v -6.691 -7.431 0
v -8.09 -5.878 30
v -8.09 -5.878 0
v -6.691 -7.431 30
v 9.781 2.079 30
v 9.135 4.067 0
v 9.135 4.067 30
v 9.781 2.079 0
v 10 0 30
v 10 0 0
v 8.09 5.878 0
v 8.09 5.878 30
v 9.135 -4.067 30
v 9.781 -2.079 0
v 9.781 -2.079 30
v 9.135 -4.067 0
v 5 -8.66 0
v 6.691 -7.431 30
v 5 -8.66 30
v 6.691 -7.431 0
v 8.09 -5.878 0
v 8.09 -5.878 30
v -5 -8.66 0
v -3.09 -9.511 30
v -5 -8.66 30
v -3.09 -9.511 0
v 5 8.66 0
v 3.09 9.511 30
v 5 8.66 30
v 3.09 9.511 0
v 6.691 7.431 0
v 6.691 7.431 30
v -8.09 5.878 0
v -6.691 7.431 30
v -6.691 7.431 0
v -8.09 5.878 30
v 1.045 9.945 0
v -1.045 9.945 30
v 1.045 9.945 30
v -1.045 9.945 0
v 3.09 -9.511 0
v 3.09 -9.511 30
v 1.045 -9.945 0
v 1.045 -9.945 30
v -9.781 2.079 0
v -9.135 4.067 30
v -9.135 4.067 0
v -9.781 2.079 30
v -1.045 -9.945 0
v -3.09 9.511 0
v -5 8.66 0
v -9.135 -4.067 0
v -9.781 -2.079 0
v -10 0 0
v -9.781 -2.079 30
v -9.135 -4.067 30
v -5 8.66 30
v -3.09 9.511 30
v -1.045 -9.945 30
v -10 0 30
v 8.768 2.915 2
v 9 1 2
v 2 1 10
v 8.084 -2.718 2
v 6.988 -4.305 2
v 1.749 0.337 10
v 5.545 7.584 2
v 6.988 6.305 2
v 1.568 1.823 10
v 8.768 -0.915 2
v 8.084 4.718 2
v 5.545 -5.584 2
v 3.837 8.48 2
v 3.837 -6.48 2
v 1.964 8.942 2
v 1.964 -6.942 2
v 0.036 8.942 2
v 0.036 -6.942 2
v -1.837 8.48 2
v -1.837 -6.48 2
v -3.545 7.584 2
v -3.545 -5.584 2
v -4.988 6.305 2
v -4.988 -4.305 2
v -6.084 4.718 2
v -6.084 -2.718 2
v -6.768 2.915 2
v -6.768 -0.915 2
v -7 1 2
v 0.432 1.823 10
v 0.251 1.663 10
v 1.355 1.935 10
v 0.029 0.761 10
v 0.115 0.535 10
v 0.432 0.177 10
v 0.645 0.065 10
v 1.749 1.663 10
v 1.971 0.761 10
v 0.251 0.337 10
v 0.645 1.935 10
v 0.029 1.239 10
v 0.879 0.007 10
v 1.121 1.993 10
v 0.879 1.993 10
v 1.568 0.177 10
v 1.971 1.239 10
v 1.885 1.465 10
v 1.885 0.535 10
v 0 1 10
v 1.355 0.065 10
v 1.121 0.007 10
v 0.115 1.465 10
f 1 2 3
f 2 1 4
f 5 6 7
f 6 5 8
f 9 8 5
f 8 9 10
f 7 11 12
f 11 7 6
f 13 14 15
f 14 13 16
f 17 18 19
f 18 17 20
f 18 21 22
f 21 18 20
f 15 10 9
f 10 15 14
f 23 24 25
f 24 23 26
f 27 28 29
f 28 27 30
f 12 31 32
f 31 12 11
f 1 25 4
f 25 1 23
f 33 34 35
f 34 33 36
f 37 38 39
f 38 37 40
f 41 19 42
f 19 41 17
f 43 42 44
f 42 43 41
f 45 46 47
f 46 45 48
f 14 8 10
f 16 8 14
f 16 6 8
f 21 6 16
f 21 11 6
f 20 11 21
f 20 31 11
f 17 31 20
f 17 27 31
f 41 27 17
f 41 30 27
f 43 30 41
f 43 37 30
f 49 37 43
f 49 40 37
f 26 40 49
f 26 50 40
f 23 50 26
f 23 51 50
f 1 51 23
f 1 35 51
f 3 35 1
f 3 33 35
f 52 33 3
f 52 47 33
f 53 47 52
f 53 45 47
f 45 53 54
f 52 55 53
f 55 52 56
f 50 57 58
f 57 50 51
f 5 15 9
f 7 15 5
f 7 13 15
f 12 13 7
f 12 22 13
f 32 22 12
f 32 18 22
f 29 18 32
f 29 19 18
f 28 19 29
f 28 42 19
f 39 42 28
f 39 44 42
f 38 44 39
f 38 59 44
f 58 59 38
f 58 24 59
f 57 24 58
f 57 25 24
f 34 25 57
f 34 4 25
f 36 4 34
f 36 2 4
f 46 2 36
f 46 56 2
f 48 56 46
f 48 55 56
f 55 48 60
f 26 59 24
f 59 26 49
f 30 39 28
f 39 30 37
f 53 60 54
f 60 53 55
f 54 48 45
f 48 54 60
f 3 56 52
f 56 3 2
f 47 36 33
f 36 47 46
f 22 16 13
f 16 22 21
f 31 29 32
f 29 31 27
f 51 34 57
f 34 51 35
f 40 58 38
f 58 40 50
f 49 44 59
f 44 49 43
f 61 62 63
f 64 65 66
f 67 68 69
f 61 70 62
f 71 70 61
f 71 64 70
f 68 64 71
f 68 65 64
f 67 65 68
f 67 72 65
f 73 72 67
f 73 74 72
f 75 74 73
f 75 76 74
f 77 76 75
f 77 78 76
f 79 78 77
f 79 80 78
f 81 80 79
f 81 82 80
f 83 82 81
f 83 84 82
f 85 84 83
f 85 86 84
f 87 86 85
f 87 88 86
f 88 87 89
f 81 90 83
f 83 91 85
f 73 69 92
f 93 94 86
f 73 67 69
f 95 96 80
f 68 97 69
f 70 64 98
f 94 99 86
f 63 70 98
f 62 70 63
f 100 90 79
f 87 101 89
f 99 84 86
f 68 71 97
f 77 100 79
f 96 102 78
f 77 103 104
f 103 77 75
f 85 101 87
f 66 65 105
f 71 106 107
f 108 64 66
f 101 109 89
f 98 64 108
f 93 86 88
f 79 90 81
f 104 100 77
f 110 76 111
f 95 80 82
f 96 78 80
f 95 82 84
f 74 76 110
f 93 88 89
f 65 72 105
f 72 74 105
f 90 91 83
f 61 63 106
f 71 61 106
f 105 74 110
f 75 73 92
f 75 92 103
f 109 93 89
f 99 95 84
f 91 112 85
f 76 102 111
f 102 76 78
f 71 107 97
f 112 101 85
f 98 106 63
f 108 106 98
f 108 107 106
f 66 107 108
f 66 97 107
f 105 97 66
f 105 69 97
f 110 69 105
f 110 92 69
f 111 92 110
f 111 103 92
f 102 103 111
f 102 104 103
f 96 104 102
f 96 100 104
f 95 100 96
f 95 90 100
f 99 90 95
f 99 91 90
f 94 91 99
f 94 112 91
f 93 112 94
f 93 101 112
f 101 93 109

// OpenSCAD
difference(){
//cube([10,10,5]);
cylinder(h=30,r=10);
translate([1,1,2])
	cylinder(8,8);
	//cube([8,8,3.01]);
}
